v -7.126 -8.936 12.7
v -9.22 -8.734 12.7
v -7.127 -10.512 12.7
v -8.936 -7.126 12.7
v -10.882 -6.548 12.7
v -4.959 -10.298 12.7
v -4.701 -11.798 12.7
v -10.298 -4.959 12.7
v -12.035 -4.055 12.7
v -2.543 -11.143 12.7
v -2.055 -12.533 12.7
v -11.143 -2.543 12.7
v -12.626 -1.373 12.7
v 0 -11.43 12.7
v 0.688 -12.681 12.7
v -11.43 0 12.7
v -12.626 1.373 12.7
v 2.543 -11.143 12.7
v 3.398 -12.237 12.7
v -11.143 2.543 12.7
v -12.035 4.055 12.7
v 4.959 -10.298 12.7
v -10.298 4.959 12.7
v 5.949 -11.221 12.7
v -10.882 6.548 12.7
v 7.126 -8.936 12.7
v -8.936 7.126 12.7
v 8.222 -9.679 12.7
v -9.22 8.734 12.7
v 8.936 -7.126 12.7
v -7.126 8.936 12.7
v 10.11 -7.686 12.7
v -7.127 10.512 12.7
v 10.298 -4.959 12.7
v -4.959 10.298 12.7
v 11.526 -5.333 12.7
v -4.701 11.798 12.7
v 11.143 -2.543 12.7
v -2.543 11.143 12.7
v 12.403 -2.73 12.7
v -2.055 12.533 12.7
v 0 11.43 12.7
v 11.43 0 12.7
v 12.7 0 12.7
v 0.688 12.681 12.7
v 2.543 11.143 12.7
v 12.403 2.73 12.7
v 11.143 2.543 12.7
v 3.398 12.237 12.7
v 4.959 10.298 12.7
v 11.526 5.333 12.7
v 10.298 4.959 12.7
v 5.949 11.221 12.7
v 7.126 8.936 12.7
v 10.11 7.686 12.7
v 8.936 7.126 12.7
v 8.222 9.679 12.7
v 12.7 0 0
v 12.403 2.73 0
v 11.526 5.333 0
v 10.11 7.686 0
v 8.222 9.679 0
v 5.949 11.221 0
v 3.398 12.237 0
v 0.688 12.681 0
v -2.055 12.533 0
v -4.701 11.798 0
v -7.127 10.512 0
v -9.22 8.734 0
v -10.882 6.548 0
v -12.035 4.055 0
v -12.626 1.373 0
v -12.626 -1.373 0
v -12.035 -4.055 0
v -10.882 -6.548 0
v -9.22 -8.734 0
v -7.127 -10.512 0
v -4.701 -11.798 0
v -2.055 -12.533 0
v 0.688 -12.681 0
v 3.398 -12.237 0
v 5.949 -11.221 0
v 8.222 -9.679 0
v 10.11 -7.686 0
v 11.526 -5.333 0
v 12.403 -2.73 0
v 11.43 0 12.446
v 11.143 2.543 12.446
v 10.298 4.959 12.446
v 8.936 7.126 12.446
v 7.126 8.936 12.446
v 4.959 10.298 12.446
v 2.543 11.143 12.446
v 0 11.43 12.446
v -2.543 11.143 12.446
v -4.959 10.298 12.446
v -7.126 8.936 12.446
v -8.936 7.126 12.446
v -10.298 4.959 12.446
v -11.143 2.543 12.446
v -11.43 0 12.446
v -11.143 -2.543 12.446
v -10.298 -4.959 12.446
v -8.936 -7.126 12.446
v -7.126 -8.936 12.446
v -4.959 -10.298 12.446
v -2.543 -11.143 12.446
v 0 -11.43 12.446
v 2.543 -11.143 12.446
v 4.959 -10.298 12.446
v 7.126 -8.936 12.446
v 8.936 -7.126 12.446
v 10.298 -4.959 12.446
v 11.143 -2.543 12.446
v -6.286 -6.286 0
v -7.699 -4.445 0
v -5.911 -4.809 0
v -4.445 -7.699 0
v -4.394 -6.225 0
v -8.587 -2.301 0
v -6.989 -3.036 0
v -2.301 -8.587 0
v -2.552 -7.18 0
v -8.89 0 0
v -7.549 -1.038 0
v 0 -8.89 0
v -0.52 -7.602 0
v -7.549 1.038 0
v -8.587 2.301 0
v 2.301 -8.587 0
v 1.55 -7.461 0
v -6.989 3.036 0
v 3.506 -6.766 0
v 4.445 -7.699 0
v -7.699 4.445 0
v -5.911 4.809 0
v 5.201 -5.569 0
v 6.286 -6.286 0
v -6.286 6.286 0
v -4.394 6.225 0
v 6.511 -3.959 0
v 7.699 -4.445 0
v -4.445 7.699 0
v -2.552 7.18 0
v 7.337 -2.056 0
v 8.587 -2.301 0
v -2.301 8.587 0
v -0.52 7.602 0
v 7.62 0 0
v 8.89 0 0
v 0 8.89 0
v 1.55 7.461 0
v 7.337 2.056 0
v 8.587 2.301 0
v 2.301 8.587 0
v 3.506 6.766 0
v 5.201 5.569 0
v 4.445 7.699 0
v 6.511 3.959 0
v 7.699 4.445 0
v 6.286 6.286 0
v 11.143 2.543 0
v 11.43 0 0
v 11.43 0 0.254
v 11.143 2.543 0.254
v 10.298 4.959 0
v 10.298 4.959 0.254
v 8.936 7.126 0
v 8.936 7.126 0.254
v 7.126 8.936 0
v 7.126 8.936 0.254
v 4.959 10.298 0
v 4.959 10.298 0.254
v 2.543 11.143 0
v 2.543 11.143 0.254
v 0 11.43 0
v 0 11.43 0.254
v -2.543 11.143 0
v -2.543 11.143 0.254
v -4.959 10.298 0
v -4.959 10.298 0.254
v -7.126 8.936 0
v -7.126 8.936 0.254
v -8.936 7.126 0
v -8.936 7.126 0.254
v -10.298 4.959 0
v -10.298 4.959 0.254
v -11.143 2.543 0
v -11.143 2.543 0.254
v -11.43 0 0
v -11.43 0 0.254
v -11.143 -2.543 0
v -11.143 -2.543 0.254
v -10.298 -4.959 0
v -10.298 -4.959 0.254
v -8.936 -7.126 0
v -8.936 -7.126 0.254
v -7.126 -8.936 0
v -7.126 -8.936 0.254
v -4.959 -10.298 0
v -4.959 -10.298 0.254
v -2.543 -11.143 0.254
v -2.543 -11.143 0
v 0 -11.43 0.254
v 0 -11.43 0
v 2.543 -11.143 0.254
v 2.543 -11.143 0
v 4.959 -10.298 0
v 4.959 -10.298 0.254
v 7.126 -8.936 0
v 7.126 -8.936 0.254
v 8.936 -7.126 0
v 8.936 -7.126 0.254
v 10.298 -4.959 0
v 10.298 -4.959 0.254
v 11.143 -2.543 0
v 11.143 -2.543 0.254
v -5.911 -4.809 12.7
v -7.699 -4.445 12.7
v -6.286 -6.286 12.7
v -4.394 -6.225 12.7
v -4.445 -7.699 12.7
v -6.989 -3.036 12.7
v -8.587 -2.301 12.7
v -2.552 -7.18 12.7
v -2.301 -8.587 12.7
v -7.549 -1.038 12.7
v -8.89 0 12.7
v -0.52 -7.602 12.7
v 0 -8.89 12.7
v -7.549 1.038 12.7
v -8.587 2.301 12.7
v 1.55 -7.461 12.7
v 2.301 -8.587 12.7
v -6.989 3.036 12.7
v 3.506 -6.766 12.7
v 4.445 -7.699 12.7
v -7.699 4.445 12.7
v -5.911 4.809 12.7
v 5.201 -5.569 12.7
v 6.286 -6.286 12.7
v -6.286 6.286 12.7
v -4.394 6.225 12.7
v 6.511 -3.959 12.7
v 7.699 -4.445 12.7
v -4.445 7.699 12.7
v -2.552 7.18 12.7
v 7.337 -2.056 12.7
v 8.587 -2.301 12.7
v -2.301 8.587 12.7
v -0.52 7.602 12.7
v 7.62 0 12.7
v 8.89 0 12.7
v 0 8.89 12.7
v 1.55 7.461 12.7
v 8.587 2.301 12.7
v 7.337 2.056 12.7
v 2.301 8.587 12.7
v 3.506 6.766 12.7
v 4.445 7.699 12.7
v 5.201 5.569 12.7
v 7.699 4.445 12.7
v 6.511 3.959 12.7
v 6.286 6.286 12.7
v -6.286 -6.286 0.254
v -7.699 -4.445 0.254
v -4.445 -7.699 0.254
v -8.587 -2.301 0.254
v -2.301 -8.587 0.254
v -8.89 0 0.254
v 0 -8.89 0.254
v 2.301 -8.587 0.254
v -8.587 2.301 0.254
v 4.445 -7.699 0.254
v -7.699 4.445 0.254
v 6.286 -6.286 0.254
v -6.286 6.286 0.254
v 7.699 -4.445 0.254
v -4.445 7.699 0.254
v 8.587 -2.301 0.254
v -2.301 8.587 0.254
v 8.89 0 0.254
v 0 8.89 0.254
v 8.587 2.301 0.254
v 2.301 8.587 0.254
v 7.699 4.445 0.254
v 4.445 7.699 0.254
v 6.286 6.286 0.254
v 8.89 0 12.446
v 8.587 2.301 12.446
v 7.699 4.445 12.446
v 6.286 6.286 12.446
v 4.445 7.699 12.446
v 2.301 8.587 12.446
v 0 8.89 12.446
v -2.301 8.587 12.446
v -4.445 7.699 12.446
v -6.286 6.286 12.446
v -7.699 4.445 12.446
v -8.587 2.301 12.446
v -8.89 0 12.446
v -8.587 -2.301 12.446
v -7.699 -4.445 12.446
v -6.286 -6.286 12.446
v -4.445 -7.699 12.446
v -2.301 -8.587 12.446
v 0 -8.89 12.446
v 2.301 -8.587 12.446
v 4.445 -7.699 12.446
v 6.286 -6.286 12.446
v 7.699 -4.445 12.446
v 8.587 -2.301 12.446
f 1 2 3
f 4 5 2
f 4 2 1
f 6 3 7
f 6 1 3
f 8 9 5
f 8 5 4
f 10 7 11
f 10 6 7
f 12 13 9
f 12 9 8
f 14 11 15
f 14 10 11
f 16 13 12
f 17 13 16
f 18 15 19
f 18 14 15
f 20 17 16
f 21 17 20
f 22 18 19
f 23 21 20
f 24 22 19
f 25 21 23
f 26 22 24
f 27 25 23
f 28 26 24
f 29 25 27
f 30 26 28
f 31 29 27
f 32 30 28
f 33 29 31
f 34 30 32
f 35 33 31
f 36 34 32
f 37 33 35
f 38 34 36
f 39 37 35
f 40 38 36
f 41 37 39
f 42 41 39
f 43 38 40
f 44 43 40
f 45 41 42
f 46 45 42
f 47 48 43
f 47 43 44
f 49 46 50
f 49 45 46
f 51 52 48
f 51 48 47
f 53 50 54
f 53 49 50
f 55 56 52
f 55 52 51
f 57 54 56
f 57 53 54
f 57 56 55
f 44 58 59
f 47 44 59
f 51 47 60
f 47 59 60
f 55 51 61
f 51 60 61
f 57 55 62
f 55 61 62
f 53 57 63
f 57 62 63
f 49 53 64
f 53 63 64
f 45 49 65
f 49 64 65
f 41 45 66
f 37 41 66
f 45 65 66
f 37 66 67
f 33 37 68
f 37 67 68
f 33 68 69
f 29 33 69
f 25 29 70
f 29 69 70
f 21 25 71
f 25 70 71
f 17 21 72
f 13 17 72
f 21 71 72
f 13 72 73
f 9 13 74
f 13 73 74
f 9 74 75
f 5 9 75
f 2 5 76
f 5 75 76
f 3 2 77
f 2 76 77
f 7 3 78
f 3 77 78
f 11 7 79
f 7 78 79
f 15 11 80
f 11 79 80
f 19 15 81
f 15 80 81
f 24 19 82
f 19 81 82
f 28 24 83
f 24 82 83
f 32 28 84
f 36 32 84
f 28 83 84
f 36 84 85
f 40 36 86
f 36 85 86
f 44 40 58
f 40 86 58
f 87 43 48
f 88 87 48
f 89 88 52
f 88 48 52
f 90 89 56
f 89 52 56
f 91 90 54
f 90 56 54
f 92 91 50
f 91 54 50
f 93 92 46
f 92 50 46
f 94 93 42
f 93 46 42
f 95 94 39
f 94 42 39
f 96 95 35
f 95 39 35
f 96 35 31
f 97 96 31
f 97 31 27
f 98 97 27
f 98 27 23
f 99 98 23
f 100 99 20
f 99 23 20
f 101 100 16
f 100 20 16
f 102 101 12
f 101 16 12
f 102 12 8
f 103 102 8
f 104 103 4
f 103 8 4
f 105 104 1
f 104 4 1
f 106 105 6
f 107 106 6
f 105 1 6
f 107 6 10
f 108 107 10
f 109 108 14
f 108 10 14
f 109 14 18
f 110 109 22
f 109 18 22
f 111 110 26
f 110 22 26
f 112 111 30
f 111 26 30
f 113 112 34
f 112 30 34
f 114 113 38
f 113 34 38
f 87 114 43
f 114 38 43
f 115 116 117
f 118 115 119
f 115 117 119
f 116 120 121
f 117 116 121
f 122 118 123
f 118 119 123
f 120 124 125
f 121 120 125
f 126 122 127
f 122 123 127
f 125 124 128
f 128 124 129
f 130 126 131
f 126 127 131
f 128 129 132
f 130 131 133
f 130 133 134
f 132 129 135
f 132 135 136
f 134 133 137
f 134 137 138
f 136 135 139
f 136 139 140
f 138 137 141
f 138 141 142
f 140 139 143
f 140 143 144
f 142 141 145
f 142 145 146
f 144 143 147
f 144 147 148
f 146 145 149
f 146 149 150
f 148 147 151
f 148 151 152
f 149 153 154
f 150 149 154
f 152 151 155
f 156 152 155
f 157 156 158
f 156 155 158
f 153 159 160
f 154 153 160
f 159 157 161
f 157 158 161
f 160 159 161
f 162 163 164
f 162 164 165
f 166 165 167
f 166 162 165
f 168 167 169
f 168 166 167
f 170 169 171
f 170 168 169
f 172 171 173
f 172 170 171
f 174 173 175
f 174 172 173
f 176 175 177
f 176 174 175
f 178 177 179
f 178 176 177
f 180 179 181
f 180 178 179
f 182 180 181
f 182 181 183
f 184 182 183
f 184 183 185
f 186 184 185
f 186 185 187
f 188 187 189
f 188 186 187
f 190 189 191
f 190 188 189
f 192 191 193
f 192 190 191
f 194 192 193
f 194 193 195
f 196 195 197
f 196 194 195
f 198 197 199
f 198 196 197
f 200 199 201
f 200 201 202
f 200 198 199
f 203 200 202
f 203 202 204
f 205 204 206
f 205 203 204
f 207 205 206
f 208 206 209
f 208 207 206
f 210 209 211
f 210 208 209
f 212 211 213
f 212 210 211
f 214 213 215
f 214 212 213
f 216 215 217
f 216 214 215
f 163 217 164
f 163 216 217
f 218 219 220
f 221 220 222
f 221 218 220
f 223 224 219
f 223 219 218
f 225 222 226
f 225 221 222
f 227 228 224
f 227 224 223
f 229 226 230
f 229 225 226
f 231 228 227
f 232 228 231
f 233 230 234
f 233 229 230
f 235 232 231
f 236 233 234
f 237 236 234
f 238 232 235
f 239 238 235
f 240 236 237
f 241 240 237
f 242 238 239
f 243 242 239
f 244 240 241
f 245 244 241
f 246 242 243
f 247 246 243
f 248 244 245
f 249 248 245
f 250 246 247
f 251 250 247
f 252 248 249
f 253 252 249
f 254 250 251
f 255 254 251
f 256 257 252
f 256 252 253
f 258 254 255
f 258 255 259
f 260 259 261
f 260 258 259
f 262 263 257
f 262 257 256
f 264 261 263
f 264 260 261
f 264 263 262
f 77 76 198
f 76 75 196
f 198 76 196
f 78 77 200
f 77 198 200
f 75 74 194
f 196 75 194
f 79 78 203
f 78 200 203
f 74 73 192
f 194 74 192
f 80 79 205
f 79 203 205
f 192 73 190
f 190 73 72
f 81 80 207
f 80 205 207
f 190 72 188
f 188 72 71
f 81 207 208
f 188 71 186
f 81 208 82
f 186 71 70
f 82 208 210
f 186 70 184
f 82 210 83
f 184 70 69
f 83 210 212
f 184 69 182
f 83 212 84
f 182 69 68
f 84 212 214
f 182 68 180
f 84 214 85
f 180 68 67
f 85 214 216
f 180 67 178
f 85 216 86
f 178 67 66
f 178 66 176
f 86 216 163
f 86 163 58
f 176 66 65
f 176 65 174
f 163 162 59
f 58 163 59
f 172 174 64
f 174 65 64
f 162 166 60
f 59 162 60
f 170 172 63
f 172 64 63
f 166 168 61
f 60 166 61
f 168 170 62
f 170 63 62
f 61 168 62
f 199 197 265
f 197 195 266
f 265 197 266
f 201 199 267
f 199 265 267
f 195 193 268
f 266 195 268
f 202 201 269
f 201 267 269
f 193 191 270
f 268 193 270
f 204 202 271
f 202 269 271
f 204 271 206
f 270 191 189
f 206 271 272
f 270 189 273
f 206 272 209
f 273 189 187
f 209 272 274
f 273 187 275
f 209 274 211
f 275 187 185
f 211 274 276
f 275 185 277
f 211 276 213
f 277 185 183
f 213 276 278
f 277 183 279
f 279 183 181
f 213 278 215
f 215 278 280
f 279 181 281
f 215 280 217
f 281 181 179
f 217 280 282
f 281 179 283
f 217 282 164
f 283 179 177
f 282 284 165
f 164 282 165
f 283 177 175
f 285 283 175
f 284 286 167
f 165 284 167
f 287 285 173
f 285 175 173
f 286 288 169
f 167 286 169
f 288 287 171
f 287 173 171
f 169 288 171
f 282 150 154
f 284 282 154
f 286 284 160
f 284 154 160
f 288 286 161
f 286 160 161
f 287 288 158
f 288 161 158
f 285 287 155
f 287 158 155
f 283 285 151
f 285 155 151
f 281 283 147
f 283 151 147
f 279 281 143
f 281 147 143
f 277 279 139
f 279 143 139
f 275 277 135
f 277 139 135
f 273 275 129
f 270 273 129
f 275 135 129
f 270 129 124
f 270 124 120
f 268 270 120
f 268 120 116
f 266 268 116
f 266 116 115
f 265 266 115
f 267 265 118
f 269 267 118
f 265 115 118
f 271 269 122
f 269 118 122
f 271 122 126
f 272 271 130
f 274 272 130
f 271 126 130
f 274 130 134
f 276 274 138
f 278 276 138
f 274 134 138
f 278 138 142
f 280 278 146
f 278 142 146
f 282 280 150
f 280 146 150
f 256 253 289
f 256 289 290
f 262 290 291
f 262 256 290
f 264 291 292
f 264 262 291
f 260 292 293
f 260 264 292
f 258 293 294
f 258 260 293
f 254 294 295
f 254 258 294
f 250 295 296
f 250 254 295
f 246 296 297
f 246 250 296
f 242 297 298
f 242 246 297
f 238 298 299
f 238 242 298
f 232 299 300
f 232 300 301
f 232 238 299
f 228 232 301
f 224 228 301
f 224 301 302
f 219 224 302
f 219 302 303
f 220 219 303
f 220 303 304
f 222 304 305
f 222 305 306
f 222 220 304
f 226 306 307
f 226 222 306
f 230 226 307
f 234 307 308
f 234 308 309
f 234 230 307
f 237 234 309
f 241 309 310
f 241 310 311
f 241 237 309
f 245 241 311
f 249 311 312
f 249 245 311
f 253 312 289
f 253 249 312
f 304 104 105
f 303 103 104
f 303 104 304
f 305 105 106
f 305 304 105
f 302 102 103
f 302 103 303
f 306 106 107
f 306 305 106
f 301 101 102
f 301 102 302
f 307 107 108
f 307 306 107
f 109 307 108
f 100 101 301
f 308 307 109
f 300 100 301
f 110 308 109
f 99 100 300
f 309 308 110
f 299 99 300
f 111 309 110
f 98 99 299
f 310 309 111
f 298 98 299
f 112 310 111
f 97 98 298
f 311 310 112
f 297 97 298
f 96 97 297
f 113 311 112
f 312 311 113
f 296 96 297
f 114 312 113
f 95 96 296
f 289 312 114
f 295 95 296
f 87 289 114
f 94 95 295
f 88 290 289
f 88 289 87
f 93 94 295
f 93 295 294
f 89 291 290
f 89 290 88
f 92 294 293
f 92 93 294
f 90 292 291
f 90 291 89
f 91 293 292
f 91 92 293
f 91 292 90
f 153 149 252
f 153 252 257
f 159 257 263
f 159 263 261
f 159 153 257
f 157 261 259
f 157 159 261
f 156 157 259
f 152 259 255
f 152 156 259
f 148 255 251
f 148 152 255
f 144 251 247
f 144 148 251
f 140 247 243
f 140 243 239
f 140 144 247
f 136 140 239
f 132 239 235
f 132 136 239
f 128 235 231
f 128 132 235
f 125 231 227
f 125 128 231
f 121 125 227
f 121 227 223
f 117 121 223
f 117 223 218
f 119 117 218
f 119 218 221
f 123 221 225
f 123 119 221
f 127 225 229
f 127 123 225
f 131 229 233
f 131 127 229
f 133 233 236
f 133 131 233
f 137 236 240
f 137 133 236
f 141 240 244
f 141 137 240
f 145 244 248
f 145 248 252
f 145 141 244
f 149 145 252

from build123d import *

# Parameters (mm, degrees)
SKETCH1_R           = 12.7
SKETCH1_R_2         = 7.62
BOSS_EXTRUDE1_DEPTH = 12.7
SKETCH2_R           = 11.43
SKETCH2_R_2         = 8.89
CUT_EXTRUDE1_DEPTH  = 0.254


with BuildPart() as part:
    # Sketch1 → Boss-Extrude1 (new body)
    with BuildSketch(Plane.XY):
        Circle(SKETCH1_R)
        Circle(SKETCH1_R_2, mode=Mode.SUBTRACT)
    extrude(amount=BOSS_EXTRUDE1_DEPTH)

    # Sketch2 → Cut-Extrude1 (cut)
    with BuildSketch(Plane.XY.offset(12.7)):
        Circle(SKETCH2_R)
        Circle(SKETCH2_R_2, mode=Mode.SUBTRACT)
    cut_extrude1 = extrude(amount=-CUT_EXTRUDE1_DEPTH, mode=Mode.SUBTRACT)

    # Mirror1: Cut-Extrude1 across plane
    add(cut_extrude1.mirror(Plane.XY.offset(6.35)), mode=Mode.SUBTRACT)


solid = part.part
